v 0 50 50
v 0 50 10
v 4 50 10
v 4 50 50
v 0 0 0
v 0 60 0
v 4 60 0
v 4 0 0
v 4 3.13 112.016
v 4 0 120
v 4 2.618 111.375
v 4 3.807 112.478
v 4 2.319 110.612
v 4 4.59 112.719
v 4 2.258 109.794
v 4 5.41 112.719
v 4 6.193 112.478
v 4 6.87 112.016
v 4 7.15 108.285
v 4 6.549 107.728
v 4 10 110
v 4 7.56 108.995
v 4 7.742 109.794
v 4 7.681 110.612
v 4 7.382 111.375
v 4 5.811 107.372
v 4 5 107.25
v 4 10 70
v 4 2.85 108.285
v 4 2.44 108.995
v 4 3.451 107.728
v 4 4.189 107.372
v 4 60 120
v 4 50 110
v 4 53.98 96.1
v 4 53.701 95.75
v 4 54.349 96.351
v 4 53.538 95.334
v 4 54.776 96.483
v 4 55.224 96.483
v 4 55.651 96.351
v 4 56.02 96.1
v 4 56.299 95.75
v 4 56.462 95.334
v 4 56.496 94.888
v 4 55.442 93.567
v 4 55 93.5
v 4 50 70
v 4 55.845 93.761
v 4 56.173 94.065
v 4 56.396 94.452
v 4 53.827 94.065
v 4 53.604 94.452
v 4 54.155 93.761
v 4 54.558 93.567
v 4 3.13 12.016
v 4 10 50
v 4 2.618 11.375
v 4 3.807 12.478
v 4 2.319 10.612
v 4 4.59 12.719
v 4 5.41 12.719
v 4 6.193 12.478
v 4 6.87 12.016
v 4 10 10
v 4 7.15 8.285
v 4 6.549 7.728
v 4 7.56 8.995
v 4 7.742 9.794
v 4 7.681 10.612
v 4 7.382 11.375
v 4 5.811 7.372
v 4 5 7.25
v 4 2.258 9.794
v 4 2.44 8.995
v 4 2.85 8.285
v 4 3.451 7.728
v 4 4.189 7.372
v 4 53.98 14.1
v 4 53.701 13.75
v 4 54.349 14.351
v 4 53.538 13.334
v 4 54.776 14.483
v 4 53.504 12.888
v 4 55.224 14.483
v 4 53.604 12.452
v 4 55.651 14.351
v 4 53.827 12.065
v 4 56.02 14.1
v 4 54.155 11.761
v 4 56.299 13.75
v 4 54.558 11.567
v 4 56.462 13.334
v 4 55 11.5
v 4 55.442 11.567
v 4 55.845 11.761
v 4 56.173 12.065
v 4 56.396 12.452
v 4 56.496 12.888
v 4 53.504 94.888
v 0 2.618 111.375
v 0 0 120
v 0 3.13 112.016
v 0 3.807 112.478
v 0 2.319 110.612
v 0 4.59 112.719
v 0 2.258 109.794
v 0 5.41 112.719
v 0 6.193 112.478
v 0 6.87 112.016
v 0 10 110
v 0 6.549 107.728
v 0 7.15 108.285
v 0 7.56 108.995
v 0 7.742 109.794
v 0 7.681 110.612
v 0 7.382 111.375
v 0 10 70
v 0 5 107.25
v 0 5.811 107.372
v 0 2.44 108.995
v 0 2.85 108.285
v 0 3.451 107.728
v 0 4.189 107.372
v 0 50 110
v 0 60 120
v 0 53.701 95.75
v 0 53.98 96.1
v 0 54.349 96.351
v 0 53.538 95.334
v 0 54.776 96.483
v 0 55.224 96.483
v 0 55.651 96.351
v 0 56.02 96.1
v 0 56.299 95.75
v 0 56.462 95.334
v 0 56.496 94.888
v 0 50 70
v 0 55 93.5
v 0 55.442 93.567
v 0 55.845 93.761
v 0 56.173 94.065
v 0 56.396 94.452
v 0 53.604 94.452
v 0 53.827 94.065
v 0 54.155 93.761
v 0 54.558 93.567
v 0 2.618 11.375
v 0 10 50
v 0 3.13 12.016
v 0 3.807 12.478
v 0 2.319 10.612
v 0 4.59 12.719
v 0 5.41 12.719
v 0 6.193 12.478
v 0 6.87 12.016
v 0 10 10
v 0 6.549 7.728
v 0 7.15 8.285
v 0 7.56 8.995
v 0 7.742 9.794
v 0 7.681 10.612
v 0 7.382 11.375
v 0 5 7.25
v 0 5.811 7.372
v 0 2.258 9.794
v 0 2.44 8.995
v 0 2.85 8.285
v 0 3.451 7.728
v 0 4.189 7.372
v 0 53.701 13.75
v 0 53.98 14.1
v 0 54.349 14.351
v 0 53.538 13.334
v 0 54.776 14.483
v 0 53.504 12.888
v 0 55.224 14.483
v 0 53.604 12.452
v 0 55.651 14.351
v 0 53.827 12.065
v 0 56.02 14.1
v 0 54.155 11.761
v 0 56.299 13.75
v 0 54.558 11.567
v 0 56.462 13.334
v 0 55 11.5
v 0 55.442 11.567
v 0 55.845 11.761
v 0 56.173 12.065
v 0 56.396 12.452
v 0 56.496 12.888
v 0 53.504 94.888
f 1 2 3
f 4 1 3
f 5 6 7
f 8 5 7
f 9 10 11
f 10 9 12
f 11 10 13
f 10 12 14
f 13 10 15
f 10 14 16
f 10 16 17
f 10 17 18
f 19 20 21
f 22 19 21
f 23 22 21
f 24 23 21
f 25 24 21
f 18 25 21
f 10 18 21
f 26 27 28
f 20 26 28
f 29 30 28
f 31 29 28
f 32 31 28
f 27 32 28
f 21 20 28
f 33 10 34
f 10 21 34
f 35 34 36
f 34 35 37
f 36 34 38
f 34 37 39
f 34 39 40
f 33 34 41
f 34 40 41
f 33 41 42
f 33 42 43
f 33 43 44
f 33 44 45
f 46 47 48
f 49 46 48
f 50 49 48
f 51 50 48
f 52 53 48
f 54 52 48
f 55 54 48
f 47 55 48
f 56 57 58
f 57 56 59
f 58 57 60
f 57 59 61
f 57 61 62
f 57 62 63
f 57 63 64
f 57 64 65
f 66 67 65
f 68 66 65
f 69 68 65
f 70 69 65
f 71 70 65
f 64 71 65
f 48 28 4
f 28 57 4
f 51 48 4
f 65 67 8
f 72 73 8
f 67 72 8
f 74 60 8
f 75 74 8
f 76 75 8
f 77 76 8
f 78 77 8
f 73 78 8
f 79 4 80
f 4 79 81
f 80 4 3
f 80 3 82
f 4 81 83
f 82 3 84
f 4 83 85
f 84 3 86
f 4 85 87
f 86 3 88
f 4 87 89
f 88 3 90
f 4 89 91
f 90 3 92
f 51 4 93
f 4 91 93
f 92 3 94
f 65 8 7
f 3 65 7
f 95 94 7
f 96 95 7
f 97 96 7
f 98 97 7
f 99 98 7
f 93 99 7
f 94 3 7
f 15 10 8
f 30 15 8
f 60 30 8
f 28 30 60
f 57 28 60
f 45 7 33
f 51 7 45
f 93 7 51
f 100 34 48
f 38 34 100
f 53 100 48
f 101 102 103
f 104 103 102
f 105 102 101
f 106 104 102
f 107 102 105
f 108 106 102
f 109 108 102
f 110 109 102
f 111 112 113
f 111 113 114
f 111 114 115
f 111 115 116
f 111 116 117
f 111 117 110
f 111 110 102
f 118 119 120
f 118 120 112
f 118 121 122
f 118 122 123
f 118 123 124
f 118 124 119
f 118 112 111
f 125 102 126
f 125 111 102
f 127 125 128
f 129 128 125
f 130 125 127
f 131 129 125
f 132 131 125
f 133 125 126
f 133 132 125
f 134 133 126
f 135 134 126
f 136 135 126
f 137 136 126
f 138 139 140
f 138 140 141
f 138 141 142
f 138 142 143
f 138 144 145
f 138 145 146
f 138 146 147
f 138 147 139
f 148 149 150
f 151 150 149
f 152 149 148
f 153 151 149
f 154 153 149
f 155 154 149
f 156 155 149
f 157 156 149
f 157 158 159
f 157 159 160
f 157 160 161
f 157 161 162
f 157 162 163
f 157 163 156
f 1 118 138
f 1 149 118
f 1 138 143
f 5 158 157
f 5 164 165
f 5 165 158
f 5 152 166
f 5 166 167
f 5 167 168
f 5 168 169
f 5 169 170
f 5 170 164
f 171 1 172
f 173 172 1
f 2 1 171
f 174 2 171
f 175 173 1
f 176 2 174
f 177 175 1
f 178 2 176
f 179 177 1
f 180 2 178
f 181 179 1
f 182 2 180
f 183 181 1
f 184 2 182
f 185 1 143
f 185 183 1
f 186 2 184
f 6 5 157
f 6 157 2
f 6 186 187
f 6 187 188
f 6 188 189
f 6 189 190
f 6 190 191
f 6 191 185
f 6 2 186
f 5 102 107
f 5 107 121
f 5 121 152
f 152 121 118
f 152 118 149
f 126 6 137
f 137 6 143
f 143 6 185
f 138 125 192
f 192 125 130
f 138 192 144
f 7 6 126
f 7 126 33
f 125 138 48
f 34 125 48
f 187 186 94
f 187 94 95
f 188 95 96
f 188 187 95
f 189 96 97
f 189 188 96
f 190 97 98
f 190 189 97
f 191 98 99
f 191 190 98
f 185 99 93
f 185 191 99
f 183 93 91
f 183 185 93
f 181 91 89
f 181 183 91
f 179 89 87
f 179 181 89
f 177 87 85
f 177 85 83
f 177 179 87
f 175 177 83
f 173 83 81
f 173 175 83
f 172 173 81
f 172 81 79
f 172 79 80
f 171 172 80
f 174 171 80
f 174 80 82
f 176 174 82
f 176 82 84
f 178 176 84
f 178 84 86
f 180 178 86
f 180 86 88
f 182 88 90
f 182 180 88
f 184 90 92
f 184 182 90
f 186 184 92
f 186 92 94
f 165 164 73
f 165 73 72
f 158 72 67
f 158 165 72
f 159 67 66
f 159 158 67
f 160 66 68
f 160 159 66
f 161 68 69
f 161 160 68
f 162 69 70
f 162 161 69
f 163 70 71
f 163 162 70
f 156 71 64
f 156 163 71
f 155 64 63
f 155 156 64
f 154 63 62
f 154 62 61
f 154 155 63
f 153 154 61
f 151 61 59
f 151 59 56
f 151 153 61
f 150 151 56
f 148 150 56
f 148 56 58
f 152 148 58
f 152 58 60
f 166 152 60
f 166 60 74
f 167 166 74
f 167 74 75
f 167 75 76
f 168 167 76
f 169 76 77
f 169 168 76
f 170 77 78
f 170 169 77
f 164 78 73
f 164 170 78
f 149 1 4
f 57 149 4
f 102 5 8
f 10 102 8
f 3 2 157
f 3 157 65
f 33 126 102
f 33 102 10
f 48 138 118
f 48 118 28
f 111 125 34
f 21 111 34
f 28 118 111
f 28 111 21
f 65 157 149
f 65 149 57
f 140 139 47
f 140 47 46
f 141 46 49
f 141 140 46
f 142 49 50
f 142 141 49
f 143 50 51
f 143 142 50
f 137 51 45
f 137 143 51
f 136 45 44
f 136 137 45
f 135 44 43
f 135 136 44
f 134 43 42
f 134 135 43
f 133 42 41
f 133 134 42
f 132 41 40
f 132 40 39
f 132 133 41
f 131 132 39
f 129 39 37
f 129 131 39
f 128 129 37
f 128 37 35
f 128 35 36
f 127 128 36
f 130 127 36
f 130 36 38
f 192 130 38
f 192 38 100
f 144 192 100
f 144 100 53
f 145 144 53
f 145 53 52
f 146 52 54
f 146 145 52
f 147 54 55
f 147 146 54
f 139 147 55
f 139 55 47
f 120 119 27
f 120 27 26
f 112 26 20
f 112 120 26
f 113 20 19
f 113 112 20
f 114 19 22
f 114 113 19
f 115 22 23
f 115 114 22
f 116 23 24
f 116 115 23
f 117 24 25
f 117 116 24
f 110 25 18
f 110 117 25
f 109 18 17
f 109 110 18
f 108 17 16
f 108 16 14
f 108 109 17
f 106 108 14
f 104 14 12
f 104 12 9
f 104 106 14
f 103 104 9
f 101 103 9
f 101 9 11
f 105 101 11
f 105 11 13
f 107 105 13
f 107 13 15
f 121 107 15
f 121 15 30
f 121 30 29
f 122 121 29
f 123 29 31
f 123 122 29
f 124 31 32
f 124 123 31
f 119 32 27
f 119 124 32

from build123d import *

# Parameters (mm, degrees)
CYLINDER002_R           = 1.5
CYLINDER002_DEPTH       = 4
CYLINDER002_PITCH_ANGLE = 90
CYLINDER003_R           = 1.5
CYLINDER003_DEPTH       = 4
CYLINDER003_PITCH_ANGLE = 90
CYLINDER_R              = 2.75
CYLINDER_DEPTH          = 4
CYLINDER_PITCH_ANGLE    = 90
CYLINDER001_R           = 2.75
CYLINDER001_DEPTH       = 4
CYLINDER001_PITCH_ANGLE = 90
BOX002_W                = 4
BOX002_H                = 40
BOX002_DEPTH            = 40
BOX001_W                = 4
BOX001_H                = 40
BOX001_DEPTH            = 40
BOX_W                   = 4
BOX_H                   = 60
BOX_DEPTH               = 120


with BuildPart() as cilindro002:
    # Cylinder002 → Cylinder002 (new body)
    with BuildSketch(Plane.XY):
        Circle(CYLINDER002_R)
    extrude(amount=CYLINDER002_DEPTH)


with BuildPart() as cilindro002_1:
    # Cylinder002 pitch: moved
    add(cilindro002.part.rotate(Axis((0, 0, 0), (0, 1, 0)), CYLINDER002_PITCH_ANGLE))


with BuildPart() as cilindro002_2:
    # Cylinder002 placement: moved
    add(cilindro002_1.part.moved(Location((0, 55, 95))))


with BuildPart() as cilindro003:
    # Cylinder003 → Cylinder003 (new body)
    with BuildSketch(Plane.XY):
        Circle(CYLINDER003_R)
    extrude(amount=CYLINDER003_DEPTH)


with BuildPart() as cilindro003_1:
    # Cylinder003 pitch: moved
    add(cilindro003.part.rotate(Axis((0, 0, 0), (0, 1, 0)), CYLINDER003_PITCH_ANGLE))


with BuildPart() as cilindro003_2:
    # Cylinder003 placement: moved
    add(cilindro003_1.part.moved(Location((0, 55, 13))))


with BuildPart() as cilindro:
    # Cylinder → Cylinder (new body)
    with BuildSketch(Plane.XY):
        Circle(CYLINDER_R)
    extrude(amount=CYLINDER_DEPTH)


with BuildPart() as cilindro_1:
    # Cylinder pitch: moved
    add(cilindro.part.rotate(Axis((0, 0, 0), (0, 1, 0)), CYLINDER_PITCH_ANGLE))


with BuildPart() as cilindro_2:
    # Cylinder placement: moved
    add(cilindro_1.part.moved(Location((0, 5, 10))))


with BuildPart() as cilindro001:
    # Cylinder001 → Cylinder001 (new body)
    with BuildSketch(Plane.XY):
        Circle(CYLINDER001_R)
    extrude(amount=CYLINDER001_DEPTH)


with BuildPart() as cilindro001_1:
    # Cylinder001 pitch: moved
    add(cilindro001.part.rotate(Axis((0, 0, 0), (0, 1, 0)), CYLINDER001_PITCH_ANGLE))


with BuildPart() as cilindro001_2:
    # Cylinder001 placement: moved
    add(cilindro001_1.part.moved(Location((0, 5, 110))))


with BuildPart() as cubo002:
    # Box002 → Box002 (new body)
    with BuildSketch(Plane(origin=(0, 10, 70), x_dir=(1, 0, 0), z_dir=(0, 0, 1))):
        with Locations((2, 20)):
            Rectangle(BOX002_W, BOX002_H)
    extrude(amount=BOX002_DEPTH)


with BuildPart() as fusion001:
    # Box001 → Box001 (new body)
    with BuildSketch(Plane(origin=(0, 10, 10), x_dir=(1, 0, 0), z_dir=(0, 0, 1))):
        with Locations((2, 20)):
            Rectangle(BOX001_W, BOX001_H)
    extrude(amount=BOX001_DEPTH)

    # Fusion: union Cubo002
    add(cubo002.part)

    # Fusion001: union Cilindro002, Cilindro003, Cilindro, Cilindro001
    add(cilindro002_2.part)
    add(cilindro003_2.part)
    add(cilindro_2.part)
    add(cilindro001_2.part)


with BuildPart() as cut:
    # Box → Box (new body)
    with BuildSketch(Plane.XY):
        with Locations((2, 30)):
            Rectangle(BOX_W, BOX_H)
    extrude(amount=BOX_DEPTH)

    # Cut: cut Fusion001
    add(fusion001.part, mode=Mode.SUBTRACT)


solid = cut.part
